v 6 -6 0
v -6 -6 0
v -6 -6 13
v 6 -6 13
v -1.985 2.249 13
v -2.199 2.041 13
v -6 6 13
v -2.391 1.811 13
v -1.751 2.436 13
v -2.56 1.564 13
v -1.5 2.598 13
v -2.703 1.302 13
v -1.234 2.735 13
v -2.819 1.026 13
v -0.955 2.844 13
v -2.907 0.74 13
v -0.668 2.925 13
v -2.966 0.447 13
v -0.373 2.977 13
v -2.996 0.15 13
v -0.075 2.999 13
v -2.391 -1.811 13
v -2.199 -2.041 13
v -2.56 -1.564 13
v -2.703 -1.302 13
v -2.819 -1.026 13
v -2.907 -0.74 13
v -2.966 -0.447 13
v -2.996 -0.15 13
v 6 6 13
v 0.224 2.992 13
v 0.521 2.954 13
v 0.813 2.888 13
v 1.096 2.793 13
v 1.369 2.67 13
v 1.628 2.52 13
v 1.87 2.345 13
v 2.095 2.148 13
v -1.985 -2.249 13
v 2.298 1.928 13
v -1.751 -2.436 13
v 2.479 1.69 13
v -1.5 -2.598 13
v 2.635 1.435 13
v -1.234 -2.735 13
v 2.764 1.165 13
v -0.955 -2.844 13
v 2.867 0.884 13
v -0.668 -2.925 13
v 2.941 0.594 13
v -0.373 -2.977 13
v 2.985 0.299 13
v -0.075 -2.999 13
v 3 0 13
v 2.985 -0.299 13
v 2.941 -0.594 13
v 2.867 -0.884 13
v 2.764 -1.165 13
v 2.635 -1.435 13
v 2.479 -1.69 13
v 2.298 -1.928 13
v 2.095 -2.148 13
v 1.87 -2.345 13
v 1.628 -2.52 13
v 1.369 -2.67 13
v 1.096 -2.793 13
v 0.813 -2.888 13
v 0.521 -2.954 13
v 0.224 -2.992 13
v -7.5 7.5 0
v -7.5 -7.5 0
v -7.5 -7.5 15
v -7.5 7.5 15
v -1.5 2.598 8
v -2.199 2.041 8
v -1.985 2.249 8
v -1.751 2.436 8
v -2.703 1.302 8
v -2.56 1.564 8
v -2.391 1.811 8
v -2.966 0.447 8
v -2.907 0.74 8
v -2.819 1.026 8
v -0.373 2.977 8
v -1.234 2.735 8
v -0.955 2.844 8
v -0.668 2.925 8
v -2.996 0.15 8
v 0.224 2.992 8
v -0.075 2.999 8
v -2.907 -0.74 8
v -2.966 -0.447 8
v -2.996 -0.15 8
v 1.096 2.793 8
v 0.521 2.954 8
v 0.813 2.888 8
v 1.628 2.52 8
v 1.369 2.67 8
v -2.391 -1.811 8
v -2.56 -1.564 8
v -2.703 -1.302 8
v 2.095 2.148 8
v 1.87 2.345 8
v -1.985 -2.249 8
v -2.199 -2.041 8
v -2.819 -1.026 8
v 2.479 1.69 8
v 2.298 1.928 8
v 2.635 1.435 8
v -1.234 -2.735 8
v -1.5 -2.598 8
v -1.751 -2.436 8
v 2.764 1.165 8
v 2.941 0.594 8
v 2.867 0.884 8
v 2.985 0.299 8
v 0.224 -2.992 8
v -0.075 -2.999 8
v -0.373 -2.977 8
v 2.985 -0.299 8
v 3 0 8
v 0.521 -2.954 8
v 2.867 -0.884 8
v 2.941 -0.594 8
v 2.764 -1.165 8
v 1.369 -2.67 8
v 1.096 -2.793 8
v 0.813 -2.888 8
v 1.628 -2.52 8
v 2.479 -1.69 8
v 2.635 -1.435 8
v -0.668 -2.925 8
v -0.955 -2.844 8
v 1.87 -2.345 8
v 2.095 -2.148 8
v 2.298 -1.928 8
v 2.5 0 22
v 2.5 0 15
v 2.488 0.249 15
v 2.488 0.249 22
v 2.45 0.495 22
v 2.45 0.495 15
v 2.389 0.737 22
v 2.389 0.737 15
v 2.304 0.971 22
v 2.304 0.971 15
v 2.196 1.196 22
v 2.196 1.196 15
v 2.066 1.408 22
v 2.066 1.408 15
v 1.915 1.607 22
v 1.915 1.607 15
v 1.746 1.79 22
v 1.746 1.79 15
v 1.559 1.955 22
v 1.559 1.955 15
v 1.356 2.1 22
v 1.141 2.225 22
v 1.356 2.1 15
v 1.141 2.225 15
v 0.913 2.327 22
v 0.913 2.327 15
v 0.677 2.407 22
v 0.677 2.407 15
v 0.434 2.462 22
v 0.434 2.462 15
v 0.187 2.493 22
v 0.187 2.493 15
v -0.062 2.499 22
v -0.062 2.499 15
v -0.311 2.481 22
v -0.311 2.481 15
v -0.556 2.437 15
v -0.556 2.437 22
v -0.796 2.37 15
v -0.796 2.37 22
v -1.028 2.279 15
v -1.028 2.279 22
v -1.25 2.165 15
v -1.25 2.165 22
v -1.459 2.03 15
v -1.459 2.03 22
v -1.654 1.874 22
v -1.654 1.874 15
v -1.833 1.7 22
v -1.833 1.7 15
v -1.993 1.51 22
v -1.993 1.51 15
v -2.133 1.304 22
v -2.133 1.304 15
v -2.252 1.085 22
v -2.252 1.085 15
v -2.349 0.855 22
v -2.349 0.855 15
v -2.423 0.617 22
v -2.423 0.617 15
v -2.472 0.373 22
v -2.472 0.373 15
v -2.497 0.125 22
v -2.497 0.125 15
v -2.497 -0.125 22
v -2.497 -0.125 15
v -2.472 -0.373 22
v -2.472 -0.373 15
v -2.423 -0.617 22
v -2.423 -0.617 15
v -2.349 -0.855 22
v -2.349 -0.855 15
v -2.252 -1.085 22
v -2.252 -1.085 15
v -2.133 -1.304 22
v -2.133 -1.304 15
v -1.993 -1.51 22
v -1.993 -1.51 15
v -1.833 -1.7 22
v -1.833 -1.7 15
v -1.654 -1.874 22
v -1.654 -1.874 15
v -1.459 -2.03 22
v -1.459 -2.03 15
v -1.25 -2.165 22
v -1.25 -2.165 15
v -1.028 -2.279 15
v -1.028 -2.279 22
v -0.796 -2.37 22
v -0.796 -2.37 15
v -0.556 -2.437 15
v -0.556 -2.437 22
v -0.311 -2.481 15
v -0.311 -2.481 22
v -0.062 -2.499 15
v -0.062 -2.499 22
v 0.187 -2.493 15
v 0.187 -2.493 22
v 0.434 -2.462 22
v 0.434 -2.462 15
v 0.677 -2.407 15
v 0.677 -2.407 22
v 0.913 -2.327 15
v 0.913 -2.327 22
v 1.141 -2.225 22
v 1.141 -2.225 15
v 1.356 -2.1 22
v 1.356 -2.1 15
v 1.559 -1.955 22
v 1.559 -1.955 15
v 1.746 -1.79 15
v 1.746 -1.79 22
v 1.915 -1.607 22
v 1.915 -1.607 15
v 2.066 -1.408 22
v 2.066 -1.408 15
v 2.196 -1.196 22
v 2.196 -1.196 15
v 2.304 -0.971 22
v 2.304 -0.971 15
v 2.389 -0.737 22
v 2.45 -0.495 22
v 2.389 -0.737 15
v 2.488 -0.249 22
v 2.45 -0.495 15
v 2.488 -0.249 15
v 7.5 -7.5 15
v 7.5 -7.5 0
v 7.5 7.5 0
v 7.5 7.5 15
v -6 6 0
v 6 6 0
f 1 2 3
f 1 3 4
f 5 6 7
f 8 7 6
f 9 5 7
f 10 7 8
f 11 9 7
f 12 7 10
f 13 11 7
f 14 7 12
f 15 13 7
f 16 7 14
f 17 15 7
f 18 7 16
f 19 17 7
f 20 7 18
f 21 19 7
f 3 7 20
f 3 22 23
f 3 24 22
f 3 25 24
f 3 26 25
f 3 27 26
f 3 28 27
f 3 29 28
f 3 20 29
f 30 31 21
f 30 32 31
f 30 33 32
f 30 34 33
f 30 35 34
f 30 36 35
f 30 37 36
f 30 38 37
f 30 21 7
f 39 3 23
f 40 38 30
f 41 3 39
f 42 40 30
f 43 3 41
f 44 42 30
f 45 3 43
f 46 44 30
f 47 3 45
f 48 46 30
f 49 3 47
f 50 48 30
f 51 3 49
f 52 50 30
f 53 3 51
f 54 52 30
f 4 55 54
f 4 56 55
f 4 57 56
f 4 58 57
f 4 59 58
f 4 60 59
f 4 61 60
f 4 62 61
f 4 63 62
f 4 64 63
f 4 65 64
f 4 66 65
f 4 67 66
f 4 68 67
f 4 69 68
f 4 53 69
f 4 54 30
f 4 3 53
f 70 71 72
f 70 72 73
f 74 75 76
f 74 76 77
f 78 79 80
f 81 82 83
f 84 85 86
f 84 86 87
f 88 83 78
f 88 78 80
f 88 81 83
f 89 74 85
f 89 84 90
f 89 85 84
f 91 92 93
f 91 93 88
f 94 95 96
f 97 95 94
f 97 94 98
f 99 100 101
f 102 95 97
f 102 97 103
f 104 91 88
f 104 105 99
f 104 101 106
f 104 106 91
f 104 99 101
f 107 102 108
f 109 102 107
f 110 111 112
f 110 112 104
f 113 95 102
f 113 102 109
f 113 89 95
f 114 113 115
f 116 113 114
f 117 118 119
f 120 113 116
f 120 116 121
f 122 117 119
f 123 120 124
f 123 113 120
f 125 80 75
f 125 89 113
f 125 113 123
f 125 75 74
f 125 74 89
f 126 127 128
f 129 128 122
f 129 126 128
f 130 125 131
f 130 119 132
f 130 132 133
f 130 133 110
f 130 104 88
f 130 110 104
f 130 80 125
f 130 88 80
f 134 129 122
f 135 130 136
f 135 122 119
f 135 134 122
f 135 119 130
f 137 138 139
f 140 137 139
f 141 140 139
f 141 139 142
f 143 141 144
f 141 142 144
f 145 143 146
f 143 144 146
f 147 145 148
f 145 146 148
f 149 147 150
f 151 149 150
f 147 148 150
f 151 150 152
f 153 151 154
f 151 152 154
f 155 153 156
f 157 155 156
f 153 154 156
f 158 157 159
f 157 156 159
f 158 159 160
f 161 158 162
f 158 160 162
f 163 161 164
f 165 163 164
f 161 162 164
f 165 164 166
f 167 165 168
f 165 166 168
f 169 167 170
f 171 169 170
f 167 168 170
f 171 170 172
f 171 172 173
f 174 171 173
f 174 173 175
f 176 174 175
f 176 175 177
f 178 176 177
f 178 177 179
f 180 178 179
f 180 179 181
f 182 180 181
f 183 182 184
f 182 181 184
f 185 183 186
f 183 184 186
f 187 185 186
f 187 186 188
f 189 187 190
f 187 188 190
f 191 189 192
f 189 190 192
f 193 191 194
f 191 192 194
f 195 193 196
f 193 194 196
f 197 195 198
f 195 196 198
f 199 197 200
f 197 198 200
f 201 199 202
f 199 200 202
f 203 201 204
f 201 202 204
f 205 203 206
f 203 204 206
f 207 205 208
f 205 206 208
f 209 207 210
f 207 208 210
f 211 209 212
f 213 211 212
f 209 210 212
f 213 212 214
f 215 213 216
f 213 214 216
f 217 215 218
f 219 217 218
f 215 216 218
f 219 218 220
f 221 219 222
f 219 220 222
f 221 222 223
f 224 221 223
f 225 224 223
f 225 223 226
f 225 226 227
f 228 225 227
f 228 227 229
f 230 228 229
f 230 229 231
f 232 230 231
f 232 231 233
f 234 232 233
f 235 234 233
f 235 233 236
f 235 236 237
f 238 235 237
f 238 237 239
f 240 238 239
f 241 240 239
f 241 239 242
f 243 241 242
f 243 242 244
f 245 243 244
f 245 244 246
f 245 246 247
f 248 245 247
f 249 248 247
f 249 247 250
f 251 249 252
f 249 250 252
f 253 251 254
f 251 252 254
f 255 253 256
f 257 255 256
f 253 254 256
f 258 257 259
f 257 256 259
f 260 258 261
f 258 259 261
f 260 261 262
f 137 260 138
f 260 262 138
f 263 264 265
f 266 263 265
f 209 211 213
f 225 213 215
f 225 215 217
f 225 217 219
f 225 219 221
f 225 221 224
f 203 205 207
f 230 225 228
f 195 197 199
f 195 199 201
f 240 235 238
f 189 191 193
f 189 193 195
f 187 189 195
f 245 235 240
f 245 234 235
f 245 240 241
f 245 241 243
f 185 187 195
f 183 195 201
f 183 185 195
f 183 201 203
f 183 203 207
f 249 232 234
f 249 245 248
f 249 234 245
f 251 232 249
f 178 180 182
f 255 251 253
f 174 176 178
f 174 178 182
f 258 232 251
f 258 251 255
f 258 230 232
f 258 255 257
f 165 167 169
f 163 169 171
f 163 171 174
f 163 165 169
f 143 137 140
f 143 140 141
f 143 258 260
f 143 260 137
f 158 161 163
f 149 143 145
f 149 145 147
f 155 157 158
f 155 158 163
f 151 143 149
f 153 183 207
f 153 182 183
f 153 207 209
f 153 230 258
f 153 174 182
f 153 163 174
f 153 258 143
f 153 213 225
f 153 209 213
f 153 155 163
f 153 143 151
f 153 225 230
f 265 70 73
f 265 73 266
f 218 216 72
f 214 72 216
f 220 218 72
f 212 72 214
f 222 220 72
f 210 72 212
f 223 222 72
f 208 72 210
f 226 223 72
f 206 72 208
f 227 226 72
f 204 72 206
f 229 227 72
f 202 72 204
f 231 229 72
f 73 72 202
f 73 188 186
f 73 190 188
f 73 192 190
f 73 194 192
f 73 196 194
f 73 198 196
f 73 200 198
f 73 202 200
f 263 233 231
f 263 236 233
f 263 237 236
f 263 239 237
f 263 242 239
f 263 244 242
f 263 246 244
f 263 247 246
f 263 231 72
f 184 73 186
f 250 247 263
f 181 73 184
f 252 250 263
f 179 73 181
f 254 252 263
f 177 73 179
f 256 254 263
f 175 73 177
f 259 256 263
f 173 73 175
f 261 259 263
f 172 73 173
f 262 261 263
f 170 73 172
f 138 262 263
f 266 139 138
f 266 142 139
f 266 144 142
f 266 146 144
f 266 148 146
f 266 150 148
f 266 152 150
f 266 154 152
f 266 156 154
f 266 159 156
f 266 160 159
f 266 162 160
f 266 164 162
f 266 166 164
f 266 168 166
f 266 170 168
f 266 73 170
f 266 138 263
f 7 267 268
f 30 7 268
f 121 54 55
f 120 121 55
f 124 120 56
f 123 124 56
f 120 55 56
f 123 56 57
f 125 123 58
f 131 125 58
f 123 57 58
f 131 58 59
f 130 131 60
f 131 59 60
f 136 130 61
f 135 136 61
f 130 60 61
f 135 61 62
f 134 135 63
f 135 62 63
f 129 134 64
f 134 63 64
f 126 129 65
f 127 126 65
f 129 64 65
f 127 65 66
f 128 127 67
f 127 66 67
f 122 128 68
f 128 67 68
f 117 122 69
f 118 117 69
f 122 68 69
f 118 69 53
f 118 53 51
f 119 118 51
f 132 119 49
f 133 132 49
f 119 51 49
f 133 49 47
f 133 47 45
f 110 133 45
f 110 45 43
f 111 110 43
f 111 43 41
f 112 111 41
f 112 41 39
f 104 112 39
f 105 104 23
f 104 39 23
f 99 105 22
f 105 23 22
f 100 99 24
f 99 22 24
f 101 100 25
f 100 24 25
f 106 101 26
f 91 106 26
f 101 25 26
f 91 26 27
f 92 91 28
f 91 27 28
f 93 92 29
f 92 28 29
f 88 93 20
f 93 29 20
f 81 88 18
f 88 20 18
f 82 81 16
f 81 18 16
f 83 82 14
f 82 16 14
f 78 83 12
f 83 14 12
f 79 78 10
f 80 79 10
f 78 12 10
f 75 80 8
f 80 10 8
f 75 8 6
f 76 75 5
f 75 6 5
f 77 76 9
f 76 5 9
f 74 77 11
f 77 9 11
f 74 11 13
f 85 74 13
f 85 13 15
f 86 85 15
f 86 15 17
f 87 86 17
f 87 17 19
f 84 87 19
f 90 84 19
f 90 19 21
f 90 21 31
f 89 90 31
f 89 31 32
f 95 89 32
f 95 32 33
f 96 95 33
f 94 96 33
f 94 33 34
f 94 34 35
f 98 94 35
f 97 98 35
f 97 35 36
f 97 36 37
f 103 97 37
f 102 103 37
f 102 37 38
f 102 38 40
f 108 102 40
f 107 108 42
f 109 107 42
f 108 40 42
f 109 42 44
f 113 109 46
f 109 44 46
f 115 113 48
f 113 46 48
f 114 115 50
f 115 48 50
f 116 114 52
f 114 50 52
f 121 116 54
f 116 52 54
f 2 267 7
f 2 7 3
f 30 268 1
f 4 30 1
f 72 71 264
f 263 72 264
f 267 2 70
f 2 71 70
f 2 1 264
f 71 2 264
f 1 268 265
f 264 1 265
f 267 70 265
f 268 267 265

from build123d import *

# Parameters (mm, degrees)
F0_W     = 15
F0_H     = 15
F1_DEPTH = 15
F2_R     = 2.5
F3_DEPTH = 7
F4_W     = 12
F4_H     = 12
F5_DEPTH = 13
F6_R     = 3
F7_DEPTH = 5


with BuildPart() as f1:
    # F0 (on Top) → F1 (new body)
    with BuildSketch(Plane.XY):
        Rectangle(F0_W, F0_H)
    extrude(amount=F1_DEPTH)

    # F2 (on face) → F3 (join)
    with BuildSketch(Plane.XY.offset(15)):
        Circle(F2_R)
    extrude(amount=F3_DEPTH)

    # F4 (on face) → F5 (cut)
    with BuildSketch(Plane(origin=(0, 0, 0), x_dir=(1, 0, 0), z_dir=(0, 0, -1))):
        Rectangle(F4_W, F4_H)
    extrude(amount=-F5_DEPTH, mode=Mode.SUBTRACT)

    # F6 (on face) → F7 (join)
    with BuildSketch(Plane(origin=(0, 0, 13), x_dir=(1, 0, 0), z_dir=(0, 0, -1))):
        Circle(F6_R)
    extrude(amount=F7_DEPTH)


solid = f1.part
